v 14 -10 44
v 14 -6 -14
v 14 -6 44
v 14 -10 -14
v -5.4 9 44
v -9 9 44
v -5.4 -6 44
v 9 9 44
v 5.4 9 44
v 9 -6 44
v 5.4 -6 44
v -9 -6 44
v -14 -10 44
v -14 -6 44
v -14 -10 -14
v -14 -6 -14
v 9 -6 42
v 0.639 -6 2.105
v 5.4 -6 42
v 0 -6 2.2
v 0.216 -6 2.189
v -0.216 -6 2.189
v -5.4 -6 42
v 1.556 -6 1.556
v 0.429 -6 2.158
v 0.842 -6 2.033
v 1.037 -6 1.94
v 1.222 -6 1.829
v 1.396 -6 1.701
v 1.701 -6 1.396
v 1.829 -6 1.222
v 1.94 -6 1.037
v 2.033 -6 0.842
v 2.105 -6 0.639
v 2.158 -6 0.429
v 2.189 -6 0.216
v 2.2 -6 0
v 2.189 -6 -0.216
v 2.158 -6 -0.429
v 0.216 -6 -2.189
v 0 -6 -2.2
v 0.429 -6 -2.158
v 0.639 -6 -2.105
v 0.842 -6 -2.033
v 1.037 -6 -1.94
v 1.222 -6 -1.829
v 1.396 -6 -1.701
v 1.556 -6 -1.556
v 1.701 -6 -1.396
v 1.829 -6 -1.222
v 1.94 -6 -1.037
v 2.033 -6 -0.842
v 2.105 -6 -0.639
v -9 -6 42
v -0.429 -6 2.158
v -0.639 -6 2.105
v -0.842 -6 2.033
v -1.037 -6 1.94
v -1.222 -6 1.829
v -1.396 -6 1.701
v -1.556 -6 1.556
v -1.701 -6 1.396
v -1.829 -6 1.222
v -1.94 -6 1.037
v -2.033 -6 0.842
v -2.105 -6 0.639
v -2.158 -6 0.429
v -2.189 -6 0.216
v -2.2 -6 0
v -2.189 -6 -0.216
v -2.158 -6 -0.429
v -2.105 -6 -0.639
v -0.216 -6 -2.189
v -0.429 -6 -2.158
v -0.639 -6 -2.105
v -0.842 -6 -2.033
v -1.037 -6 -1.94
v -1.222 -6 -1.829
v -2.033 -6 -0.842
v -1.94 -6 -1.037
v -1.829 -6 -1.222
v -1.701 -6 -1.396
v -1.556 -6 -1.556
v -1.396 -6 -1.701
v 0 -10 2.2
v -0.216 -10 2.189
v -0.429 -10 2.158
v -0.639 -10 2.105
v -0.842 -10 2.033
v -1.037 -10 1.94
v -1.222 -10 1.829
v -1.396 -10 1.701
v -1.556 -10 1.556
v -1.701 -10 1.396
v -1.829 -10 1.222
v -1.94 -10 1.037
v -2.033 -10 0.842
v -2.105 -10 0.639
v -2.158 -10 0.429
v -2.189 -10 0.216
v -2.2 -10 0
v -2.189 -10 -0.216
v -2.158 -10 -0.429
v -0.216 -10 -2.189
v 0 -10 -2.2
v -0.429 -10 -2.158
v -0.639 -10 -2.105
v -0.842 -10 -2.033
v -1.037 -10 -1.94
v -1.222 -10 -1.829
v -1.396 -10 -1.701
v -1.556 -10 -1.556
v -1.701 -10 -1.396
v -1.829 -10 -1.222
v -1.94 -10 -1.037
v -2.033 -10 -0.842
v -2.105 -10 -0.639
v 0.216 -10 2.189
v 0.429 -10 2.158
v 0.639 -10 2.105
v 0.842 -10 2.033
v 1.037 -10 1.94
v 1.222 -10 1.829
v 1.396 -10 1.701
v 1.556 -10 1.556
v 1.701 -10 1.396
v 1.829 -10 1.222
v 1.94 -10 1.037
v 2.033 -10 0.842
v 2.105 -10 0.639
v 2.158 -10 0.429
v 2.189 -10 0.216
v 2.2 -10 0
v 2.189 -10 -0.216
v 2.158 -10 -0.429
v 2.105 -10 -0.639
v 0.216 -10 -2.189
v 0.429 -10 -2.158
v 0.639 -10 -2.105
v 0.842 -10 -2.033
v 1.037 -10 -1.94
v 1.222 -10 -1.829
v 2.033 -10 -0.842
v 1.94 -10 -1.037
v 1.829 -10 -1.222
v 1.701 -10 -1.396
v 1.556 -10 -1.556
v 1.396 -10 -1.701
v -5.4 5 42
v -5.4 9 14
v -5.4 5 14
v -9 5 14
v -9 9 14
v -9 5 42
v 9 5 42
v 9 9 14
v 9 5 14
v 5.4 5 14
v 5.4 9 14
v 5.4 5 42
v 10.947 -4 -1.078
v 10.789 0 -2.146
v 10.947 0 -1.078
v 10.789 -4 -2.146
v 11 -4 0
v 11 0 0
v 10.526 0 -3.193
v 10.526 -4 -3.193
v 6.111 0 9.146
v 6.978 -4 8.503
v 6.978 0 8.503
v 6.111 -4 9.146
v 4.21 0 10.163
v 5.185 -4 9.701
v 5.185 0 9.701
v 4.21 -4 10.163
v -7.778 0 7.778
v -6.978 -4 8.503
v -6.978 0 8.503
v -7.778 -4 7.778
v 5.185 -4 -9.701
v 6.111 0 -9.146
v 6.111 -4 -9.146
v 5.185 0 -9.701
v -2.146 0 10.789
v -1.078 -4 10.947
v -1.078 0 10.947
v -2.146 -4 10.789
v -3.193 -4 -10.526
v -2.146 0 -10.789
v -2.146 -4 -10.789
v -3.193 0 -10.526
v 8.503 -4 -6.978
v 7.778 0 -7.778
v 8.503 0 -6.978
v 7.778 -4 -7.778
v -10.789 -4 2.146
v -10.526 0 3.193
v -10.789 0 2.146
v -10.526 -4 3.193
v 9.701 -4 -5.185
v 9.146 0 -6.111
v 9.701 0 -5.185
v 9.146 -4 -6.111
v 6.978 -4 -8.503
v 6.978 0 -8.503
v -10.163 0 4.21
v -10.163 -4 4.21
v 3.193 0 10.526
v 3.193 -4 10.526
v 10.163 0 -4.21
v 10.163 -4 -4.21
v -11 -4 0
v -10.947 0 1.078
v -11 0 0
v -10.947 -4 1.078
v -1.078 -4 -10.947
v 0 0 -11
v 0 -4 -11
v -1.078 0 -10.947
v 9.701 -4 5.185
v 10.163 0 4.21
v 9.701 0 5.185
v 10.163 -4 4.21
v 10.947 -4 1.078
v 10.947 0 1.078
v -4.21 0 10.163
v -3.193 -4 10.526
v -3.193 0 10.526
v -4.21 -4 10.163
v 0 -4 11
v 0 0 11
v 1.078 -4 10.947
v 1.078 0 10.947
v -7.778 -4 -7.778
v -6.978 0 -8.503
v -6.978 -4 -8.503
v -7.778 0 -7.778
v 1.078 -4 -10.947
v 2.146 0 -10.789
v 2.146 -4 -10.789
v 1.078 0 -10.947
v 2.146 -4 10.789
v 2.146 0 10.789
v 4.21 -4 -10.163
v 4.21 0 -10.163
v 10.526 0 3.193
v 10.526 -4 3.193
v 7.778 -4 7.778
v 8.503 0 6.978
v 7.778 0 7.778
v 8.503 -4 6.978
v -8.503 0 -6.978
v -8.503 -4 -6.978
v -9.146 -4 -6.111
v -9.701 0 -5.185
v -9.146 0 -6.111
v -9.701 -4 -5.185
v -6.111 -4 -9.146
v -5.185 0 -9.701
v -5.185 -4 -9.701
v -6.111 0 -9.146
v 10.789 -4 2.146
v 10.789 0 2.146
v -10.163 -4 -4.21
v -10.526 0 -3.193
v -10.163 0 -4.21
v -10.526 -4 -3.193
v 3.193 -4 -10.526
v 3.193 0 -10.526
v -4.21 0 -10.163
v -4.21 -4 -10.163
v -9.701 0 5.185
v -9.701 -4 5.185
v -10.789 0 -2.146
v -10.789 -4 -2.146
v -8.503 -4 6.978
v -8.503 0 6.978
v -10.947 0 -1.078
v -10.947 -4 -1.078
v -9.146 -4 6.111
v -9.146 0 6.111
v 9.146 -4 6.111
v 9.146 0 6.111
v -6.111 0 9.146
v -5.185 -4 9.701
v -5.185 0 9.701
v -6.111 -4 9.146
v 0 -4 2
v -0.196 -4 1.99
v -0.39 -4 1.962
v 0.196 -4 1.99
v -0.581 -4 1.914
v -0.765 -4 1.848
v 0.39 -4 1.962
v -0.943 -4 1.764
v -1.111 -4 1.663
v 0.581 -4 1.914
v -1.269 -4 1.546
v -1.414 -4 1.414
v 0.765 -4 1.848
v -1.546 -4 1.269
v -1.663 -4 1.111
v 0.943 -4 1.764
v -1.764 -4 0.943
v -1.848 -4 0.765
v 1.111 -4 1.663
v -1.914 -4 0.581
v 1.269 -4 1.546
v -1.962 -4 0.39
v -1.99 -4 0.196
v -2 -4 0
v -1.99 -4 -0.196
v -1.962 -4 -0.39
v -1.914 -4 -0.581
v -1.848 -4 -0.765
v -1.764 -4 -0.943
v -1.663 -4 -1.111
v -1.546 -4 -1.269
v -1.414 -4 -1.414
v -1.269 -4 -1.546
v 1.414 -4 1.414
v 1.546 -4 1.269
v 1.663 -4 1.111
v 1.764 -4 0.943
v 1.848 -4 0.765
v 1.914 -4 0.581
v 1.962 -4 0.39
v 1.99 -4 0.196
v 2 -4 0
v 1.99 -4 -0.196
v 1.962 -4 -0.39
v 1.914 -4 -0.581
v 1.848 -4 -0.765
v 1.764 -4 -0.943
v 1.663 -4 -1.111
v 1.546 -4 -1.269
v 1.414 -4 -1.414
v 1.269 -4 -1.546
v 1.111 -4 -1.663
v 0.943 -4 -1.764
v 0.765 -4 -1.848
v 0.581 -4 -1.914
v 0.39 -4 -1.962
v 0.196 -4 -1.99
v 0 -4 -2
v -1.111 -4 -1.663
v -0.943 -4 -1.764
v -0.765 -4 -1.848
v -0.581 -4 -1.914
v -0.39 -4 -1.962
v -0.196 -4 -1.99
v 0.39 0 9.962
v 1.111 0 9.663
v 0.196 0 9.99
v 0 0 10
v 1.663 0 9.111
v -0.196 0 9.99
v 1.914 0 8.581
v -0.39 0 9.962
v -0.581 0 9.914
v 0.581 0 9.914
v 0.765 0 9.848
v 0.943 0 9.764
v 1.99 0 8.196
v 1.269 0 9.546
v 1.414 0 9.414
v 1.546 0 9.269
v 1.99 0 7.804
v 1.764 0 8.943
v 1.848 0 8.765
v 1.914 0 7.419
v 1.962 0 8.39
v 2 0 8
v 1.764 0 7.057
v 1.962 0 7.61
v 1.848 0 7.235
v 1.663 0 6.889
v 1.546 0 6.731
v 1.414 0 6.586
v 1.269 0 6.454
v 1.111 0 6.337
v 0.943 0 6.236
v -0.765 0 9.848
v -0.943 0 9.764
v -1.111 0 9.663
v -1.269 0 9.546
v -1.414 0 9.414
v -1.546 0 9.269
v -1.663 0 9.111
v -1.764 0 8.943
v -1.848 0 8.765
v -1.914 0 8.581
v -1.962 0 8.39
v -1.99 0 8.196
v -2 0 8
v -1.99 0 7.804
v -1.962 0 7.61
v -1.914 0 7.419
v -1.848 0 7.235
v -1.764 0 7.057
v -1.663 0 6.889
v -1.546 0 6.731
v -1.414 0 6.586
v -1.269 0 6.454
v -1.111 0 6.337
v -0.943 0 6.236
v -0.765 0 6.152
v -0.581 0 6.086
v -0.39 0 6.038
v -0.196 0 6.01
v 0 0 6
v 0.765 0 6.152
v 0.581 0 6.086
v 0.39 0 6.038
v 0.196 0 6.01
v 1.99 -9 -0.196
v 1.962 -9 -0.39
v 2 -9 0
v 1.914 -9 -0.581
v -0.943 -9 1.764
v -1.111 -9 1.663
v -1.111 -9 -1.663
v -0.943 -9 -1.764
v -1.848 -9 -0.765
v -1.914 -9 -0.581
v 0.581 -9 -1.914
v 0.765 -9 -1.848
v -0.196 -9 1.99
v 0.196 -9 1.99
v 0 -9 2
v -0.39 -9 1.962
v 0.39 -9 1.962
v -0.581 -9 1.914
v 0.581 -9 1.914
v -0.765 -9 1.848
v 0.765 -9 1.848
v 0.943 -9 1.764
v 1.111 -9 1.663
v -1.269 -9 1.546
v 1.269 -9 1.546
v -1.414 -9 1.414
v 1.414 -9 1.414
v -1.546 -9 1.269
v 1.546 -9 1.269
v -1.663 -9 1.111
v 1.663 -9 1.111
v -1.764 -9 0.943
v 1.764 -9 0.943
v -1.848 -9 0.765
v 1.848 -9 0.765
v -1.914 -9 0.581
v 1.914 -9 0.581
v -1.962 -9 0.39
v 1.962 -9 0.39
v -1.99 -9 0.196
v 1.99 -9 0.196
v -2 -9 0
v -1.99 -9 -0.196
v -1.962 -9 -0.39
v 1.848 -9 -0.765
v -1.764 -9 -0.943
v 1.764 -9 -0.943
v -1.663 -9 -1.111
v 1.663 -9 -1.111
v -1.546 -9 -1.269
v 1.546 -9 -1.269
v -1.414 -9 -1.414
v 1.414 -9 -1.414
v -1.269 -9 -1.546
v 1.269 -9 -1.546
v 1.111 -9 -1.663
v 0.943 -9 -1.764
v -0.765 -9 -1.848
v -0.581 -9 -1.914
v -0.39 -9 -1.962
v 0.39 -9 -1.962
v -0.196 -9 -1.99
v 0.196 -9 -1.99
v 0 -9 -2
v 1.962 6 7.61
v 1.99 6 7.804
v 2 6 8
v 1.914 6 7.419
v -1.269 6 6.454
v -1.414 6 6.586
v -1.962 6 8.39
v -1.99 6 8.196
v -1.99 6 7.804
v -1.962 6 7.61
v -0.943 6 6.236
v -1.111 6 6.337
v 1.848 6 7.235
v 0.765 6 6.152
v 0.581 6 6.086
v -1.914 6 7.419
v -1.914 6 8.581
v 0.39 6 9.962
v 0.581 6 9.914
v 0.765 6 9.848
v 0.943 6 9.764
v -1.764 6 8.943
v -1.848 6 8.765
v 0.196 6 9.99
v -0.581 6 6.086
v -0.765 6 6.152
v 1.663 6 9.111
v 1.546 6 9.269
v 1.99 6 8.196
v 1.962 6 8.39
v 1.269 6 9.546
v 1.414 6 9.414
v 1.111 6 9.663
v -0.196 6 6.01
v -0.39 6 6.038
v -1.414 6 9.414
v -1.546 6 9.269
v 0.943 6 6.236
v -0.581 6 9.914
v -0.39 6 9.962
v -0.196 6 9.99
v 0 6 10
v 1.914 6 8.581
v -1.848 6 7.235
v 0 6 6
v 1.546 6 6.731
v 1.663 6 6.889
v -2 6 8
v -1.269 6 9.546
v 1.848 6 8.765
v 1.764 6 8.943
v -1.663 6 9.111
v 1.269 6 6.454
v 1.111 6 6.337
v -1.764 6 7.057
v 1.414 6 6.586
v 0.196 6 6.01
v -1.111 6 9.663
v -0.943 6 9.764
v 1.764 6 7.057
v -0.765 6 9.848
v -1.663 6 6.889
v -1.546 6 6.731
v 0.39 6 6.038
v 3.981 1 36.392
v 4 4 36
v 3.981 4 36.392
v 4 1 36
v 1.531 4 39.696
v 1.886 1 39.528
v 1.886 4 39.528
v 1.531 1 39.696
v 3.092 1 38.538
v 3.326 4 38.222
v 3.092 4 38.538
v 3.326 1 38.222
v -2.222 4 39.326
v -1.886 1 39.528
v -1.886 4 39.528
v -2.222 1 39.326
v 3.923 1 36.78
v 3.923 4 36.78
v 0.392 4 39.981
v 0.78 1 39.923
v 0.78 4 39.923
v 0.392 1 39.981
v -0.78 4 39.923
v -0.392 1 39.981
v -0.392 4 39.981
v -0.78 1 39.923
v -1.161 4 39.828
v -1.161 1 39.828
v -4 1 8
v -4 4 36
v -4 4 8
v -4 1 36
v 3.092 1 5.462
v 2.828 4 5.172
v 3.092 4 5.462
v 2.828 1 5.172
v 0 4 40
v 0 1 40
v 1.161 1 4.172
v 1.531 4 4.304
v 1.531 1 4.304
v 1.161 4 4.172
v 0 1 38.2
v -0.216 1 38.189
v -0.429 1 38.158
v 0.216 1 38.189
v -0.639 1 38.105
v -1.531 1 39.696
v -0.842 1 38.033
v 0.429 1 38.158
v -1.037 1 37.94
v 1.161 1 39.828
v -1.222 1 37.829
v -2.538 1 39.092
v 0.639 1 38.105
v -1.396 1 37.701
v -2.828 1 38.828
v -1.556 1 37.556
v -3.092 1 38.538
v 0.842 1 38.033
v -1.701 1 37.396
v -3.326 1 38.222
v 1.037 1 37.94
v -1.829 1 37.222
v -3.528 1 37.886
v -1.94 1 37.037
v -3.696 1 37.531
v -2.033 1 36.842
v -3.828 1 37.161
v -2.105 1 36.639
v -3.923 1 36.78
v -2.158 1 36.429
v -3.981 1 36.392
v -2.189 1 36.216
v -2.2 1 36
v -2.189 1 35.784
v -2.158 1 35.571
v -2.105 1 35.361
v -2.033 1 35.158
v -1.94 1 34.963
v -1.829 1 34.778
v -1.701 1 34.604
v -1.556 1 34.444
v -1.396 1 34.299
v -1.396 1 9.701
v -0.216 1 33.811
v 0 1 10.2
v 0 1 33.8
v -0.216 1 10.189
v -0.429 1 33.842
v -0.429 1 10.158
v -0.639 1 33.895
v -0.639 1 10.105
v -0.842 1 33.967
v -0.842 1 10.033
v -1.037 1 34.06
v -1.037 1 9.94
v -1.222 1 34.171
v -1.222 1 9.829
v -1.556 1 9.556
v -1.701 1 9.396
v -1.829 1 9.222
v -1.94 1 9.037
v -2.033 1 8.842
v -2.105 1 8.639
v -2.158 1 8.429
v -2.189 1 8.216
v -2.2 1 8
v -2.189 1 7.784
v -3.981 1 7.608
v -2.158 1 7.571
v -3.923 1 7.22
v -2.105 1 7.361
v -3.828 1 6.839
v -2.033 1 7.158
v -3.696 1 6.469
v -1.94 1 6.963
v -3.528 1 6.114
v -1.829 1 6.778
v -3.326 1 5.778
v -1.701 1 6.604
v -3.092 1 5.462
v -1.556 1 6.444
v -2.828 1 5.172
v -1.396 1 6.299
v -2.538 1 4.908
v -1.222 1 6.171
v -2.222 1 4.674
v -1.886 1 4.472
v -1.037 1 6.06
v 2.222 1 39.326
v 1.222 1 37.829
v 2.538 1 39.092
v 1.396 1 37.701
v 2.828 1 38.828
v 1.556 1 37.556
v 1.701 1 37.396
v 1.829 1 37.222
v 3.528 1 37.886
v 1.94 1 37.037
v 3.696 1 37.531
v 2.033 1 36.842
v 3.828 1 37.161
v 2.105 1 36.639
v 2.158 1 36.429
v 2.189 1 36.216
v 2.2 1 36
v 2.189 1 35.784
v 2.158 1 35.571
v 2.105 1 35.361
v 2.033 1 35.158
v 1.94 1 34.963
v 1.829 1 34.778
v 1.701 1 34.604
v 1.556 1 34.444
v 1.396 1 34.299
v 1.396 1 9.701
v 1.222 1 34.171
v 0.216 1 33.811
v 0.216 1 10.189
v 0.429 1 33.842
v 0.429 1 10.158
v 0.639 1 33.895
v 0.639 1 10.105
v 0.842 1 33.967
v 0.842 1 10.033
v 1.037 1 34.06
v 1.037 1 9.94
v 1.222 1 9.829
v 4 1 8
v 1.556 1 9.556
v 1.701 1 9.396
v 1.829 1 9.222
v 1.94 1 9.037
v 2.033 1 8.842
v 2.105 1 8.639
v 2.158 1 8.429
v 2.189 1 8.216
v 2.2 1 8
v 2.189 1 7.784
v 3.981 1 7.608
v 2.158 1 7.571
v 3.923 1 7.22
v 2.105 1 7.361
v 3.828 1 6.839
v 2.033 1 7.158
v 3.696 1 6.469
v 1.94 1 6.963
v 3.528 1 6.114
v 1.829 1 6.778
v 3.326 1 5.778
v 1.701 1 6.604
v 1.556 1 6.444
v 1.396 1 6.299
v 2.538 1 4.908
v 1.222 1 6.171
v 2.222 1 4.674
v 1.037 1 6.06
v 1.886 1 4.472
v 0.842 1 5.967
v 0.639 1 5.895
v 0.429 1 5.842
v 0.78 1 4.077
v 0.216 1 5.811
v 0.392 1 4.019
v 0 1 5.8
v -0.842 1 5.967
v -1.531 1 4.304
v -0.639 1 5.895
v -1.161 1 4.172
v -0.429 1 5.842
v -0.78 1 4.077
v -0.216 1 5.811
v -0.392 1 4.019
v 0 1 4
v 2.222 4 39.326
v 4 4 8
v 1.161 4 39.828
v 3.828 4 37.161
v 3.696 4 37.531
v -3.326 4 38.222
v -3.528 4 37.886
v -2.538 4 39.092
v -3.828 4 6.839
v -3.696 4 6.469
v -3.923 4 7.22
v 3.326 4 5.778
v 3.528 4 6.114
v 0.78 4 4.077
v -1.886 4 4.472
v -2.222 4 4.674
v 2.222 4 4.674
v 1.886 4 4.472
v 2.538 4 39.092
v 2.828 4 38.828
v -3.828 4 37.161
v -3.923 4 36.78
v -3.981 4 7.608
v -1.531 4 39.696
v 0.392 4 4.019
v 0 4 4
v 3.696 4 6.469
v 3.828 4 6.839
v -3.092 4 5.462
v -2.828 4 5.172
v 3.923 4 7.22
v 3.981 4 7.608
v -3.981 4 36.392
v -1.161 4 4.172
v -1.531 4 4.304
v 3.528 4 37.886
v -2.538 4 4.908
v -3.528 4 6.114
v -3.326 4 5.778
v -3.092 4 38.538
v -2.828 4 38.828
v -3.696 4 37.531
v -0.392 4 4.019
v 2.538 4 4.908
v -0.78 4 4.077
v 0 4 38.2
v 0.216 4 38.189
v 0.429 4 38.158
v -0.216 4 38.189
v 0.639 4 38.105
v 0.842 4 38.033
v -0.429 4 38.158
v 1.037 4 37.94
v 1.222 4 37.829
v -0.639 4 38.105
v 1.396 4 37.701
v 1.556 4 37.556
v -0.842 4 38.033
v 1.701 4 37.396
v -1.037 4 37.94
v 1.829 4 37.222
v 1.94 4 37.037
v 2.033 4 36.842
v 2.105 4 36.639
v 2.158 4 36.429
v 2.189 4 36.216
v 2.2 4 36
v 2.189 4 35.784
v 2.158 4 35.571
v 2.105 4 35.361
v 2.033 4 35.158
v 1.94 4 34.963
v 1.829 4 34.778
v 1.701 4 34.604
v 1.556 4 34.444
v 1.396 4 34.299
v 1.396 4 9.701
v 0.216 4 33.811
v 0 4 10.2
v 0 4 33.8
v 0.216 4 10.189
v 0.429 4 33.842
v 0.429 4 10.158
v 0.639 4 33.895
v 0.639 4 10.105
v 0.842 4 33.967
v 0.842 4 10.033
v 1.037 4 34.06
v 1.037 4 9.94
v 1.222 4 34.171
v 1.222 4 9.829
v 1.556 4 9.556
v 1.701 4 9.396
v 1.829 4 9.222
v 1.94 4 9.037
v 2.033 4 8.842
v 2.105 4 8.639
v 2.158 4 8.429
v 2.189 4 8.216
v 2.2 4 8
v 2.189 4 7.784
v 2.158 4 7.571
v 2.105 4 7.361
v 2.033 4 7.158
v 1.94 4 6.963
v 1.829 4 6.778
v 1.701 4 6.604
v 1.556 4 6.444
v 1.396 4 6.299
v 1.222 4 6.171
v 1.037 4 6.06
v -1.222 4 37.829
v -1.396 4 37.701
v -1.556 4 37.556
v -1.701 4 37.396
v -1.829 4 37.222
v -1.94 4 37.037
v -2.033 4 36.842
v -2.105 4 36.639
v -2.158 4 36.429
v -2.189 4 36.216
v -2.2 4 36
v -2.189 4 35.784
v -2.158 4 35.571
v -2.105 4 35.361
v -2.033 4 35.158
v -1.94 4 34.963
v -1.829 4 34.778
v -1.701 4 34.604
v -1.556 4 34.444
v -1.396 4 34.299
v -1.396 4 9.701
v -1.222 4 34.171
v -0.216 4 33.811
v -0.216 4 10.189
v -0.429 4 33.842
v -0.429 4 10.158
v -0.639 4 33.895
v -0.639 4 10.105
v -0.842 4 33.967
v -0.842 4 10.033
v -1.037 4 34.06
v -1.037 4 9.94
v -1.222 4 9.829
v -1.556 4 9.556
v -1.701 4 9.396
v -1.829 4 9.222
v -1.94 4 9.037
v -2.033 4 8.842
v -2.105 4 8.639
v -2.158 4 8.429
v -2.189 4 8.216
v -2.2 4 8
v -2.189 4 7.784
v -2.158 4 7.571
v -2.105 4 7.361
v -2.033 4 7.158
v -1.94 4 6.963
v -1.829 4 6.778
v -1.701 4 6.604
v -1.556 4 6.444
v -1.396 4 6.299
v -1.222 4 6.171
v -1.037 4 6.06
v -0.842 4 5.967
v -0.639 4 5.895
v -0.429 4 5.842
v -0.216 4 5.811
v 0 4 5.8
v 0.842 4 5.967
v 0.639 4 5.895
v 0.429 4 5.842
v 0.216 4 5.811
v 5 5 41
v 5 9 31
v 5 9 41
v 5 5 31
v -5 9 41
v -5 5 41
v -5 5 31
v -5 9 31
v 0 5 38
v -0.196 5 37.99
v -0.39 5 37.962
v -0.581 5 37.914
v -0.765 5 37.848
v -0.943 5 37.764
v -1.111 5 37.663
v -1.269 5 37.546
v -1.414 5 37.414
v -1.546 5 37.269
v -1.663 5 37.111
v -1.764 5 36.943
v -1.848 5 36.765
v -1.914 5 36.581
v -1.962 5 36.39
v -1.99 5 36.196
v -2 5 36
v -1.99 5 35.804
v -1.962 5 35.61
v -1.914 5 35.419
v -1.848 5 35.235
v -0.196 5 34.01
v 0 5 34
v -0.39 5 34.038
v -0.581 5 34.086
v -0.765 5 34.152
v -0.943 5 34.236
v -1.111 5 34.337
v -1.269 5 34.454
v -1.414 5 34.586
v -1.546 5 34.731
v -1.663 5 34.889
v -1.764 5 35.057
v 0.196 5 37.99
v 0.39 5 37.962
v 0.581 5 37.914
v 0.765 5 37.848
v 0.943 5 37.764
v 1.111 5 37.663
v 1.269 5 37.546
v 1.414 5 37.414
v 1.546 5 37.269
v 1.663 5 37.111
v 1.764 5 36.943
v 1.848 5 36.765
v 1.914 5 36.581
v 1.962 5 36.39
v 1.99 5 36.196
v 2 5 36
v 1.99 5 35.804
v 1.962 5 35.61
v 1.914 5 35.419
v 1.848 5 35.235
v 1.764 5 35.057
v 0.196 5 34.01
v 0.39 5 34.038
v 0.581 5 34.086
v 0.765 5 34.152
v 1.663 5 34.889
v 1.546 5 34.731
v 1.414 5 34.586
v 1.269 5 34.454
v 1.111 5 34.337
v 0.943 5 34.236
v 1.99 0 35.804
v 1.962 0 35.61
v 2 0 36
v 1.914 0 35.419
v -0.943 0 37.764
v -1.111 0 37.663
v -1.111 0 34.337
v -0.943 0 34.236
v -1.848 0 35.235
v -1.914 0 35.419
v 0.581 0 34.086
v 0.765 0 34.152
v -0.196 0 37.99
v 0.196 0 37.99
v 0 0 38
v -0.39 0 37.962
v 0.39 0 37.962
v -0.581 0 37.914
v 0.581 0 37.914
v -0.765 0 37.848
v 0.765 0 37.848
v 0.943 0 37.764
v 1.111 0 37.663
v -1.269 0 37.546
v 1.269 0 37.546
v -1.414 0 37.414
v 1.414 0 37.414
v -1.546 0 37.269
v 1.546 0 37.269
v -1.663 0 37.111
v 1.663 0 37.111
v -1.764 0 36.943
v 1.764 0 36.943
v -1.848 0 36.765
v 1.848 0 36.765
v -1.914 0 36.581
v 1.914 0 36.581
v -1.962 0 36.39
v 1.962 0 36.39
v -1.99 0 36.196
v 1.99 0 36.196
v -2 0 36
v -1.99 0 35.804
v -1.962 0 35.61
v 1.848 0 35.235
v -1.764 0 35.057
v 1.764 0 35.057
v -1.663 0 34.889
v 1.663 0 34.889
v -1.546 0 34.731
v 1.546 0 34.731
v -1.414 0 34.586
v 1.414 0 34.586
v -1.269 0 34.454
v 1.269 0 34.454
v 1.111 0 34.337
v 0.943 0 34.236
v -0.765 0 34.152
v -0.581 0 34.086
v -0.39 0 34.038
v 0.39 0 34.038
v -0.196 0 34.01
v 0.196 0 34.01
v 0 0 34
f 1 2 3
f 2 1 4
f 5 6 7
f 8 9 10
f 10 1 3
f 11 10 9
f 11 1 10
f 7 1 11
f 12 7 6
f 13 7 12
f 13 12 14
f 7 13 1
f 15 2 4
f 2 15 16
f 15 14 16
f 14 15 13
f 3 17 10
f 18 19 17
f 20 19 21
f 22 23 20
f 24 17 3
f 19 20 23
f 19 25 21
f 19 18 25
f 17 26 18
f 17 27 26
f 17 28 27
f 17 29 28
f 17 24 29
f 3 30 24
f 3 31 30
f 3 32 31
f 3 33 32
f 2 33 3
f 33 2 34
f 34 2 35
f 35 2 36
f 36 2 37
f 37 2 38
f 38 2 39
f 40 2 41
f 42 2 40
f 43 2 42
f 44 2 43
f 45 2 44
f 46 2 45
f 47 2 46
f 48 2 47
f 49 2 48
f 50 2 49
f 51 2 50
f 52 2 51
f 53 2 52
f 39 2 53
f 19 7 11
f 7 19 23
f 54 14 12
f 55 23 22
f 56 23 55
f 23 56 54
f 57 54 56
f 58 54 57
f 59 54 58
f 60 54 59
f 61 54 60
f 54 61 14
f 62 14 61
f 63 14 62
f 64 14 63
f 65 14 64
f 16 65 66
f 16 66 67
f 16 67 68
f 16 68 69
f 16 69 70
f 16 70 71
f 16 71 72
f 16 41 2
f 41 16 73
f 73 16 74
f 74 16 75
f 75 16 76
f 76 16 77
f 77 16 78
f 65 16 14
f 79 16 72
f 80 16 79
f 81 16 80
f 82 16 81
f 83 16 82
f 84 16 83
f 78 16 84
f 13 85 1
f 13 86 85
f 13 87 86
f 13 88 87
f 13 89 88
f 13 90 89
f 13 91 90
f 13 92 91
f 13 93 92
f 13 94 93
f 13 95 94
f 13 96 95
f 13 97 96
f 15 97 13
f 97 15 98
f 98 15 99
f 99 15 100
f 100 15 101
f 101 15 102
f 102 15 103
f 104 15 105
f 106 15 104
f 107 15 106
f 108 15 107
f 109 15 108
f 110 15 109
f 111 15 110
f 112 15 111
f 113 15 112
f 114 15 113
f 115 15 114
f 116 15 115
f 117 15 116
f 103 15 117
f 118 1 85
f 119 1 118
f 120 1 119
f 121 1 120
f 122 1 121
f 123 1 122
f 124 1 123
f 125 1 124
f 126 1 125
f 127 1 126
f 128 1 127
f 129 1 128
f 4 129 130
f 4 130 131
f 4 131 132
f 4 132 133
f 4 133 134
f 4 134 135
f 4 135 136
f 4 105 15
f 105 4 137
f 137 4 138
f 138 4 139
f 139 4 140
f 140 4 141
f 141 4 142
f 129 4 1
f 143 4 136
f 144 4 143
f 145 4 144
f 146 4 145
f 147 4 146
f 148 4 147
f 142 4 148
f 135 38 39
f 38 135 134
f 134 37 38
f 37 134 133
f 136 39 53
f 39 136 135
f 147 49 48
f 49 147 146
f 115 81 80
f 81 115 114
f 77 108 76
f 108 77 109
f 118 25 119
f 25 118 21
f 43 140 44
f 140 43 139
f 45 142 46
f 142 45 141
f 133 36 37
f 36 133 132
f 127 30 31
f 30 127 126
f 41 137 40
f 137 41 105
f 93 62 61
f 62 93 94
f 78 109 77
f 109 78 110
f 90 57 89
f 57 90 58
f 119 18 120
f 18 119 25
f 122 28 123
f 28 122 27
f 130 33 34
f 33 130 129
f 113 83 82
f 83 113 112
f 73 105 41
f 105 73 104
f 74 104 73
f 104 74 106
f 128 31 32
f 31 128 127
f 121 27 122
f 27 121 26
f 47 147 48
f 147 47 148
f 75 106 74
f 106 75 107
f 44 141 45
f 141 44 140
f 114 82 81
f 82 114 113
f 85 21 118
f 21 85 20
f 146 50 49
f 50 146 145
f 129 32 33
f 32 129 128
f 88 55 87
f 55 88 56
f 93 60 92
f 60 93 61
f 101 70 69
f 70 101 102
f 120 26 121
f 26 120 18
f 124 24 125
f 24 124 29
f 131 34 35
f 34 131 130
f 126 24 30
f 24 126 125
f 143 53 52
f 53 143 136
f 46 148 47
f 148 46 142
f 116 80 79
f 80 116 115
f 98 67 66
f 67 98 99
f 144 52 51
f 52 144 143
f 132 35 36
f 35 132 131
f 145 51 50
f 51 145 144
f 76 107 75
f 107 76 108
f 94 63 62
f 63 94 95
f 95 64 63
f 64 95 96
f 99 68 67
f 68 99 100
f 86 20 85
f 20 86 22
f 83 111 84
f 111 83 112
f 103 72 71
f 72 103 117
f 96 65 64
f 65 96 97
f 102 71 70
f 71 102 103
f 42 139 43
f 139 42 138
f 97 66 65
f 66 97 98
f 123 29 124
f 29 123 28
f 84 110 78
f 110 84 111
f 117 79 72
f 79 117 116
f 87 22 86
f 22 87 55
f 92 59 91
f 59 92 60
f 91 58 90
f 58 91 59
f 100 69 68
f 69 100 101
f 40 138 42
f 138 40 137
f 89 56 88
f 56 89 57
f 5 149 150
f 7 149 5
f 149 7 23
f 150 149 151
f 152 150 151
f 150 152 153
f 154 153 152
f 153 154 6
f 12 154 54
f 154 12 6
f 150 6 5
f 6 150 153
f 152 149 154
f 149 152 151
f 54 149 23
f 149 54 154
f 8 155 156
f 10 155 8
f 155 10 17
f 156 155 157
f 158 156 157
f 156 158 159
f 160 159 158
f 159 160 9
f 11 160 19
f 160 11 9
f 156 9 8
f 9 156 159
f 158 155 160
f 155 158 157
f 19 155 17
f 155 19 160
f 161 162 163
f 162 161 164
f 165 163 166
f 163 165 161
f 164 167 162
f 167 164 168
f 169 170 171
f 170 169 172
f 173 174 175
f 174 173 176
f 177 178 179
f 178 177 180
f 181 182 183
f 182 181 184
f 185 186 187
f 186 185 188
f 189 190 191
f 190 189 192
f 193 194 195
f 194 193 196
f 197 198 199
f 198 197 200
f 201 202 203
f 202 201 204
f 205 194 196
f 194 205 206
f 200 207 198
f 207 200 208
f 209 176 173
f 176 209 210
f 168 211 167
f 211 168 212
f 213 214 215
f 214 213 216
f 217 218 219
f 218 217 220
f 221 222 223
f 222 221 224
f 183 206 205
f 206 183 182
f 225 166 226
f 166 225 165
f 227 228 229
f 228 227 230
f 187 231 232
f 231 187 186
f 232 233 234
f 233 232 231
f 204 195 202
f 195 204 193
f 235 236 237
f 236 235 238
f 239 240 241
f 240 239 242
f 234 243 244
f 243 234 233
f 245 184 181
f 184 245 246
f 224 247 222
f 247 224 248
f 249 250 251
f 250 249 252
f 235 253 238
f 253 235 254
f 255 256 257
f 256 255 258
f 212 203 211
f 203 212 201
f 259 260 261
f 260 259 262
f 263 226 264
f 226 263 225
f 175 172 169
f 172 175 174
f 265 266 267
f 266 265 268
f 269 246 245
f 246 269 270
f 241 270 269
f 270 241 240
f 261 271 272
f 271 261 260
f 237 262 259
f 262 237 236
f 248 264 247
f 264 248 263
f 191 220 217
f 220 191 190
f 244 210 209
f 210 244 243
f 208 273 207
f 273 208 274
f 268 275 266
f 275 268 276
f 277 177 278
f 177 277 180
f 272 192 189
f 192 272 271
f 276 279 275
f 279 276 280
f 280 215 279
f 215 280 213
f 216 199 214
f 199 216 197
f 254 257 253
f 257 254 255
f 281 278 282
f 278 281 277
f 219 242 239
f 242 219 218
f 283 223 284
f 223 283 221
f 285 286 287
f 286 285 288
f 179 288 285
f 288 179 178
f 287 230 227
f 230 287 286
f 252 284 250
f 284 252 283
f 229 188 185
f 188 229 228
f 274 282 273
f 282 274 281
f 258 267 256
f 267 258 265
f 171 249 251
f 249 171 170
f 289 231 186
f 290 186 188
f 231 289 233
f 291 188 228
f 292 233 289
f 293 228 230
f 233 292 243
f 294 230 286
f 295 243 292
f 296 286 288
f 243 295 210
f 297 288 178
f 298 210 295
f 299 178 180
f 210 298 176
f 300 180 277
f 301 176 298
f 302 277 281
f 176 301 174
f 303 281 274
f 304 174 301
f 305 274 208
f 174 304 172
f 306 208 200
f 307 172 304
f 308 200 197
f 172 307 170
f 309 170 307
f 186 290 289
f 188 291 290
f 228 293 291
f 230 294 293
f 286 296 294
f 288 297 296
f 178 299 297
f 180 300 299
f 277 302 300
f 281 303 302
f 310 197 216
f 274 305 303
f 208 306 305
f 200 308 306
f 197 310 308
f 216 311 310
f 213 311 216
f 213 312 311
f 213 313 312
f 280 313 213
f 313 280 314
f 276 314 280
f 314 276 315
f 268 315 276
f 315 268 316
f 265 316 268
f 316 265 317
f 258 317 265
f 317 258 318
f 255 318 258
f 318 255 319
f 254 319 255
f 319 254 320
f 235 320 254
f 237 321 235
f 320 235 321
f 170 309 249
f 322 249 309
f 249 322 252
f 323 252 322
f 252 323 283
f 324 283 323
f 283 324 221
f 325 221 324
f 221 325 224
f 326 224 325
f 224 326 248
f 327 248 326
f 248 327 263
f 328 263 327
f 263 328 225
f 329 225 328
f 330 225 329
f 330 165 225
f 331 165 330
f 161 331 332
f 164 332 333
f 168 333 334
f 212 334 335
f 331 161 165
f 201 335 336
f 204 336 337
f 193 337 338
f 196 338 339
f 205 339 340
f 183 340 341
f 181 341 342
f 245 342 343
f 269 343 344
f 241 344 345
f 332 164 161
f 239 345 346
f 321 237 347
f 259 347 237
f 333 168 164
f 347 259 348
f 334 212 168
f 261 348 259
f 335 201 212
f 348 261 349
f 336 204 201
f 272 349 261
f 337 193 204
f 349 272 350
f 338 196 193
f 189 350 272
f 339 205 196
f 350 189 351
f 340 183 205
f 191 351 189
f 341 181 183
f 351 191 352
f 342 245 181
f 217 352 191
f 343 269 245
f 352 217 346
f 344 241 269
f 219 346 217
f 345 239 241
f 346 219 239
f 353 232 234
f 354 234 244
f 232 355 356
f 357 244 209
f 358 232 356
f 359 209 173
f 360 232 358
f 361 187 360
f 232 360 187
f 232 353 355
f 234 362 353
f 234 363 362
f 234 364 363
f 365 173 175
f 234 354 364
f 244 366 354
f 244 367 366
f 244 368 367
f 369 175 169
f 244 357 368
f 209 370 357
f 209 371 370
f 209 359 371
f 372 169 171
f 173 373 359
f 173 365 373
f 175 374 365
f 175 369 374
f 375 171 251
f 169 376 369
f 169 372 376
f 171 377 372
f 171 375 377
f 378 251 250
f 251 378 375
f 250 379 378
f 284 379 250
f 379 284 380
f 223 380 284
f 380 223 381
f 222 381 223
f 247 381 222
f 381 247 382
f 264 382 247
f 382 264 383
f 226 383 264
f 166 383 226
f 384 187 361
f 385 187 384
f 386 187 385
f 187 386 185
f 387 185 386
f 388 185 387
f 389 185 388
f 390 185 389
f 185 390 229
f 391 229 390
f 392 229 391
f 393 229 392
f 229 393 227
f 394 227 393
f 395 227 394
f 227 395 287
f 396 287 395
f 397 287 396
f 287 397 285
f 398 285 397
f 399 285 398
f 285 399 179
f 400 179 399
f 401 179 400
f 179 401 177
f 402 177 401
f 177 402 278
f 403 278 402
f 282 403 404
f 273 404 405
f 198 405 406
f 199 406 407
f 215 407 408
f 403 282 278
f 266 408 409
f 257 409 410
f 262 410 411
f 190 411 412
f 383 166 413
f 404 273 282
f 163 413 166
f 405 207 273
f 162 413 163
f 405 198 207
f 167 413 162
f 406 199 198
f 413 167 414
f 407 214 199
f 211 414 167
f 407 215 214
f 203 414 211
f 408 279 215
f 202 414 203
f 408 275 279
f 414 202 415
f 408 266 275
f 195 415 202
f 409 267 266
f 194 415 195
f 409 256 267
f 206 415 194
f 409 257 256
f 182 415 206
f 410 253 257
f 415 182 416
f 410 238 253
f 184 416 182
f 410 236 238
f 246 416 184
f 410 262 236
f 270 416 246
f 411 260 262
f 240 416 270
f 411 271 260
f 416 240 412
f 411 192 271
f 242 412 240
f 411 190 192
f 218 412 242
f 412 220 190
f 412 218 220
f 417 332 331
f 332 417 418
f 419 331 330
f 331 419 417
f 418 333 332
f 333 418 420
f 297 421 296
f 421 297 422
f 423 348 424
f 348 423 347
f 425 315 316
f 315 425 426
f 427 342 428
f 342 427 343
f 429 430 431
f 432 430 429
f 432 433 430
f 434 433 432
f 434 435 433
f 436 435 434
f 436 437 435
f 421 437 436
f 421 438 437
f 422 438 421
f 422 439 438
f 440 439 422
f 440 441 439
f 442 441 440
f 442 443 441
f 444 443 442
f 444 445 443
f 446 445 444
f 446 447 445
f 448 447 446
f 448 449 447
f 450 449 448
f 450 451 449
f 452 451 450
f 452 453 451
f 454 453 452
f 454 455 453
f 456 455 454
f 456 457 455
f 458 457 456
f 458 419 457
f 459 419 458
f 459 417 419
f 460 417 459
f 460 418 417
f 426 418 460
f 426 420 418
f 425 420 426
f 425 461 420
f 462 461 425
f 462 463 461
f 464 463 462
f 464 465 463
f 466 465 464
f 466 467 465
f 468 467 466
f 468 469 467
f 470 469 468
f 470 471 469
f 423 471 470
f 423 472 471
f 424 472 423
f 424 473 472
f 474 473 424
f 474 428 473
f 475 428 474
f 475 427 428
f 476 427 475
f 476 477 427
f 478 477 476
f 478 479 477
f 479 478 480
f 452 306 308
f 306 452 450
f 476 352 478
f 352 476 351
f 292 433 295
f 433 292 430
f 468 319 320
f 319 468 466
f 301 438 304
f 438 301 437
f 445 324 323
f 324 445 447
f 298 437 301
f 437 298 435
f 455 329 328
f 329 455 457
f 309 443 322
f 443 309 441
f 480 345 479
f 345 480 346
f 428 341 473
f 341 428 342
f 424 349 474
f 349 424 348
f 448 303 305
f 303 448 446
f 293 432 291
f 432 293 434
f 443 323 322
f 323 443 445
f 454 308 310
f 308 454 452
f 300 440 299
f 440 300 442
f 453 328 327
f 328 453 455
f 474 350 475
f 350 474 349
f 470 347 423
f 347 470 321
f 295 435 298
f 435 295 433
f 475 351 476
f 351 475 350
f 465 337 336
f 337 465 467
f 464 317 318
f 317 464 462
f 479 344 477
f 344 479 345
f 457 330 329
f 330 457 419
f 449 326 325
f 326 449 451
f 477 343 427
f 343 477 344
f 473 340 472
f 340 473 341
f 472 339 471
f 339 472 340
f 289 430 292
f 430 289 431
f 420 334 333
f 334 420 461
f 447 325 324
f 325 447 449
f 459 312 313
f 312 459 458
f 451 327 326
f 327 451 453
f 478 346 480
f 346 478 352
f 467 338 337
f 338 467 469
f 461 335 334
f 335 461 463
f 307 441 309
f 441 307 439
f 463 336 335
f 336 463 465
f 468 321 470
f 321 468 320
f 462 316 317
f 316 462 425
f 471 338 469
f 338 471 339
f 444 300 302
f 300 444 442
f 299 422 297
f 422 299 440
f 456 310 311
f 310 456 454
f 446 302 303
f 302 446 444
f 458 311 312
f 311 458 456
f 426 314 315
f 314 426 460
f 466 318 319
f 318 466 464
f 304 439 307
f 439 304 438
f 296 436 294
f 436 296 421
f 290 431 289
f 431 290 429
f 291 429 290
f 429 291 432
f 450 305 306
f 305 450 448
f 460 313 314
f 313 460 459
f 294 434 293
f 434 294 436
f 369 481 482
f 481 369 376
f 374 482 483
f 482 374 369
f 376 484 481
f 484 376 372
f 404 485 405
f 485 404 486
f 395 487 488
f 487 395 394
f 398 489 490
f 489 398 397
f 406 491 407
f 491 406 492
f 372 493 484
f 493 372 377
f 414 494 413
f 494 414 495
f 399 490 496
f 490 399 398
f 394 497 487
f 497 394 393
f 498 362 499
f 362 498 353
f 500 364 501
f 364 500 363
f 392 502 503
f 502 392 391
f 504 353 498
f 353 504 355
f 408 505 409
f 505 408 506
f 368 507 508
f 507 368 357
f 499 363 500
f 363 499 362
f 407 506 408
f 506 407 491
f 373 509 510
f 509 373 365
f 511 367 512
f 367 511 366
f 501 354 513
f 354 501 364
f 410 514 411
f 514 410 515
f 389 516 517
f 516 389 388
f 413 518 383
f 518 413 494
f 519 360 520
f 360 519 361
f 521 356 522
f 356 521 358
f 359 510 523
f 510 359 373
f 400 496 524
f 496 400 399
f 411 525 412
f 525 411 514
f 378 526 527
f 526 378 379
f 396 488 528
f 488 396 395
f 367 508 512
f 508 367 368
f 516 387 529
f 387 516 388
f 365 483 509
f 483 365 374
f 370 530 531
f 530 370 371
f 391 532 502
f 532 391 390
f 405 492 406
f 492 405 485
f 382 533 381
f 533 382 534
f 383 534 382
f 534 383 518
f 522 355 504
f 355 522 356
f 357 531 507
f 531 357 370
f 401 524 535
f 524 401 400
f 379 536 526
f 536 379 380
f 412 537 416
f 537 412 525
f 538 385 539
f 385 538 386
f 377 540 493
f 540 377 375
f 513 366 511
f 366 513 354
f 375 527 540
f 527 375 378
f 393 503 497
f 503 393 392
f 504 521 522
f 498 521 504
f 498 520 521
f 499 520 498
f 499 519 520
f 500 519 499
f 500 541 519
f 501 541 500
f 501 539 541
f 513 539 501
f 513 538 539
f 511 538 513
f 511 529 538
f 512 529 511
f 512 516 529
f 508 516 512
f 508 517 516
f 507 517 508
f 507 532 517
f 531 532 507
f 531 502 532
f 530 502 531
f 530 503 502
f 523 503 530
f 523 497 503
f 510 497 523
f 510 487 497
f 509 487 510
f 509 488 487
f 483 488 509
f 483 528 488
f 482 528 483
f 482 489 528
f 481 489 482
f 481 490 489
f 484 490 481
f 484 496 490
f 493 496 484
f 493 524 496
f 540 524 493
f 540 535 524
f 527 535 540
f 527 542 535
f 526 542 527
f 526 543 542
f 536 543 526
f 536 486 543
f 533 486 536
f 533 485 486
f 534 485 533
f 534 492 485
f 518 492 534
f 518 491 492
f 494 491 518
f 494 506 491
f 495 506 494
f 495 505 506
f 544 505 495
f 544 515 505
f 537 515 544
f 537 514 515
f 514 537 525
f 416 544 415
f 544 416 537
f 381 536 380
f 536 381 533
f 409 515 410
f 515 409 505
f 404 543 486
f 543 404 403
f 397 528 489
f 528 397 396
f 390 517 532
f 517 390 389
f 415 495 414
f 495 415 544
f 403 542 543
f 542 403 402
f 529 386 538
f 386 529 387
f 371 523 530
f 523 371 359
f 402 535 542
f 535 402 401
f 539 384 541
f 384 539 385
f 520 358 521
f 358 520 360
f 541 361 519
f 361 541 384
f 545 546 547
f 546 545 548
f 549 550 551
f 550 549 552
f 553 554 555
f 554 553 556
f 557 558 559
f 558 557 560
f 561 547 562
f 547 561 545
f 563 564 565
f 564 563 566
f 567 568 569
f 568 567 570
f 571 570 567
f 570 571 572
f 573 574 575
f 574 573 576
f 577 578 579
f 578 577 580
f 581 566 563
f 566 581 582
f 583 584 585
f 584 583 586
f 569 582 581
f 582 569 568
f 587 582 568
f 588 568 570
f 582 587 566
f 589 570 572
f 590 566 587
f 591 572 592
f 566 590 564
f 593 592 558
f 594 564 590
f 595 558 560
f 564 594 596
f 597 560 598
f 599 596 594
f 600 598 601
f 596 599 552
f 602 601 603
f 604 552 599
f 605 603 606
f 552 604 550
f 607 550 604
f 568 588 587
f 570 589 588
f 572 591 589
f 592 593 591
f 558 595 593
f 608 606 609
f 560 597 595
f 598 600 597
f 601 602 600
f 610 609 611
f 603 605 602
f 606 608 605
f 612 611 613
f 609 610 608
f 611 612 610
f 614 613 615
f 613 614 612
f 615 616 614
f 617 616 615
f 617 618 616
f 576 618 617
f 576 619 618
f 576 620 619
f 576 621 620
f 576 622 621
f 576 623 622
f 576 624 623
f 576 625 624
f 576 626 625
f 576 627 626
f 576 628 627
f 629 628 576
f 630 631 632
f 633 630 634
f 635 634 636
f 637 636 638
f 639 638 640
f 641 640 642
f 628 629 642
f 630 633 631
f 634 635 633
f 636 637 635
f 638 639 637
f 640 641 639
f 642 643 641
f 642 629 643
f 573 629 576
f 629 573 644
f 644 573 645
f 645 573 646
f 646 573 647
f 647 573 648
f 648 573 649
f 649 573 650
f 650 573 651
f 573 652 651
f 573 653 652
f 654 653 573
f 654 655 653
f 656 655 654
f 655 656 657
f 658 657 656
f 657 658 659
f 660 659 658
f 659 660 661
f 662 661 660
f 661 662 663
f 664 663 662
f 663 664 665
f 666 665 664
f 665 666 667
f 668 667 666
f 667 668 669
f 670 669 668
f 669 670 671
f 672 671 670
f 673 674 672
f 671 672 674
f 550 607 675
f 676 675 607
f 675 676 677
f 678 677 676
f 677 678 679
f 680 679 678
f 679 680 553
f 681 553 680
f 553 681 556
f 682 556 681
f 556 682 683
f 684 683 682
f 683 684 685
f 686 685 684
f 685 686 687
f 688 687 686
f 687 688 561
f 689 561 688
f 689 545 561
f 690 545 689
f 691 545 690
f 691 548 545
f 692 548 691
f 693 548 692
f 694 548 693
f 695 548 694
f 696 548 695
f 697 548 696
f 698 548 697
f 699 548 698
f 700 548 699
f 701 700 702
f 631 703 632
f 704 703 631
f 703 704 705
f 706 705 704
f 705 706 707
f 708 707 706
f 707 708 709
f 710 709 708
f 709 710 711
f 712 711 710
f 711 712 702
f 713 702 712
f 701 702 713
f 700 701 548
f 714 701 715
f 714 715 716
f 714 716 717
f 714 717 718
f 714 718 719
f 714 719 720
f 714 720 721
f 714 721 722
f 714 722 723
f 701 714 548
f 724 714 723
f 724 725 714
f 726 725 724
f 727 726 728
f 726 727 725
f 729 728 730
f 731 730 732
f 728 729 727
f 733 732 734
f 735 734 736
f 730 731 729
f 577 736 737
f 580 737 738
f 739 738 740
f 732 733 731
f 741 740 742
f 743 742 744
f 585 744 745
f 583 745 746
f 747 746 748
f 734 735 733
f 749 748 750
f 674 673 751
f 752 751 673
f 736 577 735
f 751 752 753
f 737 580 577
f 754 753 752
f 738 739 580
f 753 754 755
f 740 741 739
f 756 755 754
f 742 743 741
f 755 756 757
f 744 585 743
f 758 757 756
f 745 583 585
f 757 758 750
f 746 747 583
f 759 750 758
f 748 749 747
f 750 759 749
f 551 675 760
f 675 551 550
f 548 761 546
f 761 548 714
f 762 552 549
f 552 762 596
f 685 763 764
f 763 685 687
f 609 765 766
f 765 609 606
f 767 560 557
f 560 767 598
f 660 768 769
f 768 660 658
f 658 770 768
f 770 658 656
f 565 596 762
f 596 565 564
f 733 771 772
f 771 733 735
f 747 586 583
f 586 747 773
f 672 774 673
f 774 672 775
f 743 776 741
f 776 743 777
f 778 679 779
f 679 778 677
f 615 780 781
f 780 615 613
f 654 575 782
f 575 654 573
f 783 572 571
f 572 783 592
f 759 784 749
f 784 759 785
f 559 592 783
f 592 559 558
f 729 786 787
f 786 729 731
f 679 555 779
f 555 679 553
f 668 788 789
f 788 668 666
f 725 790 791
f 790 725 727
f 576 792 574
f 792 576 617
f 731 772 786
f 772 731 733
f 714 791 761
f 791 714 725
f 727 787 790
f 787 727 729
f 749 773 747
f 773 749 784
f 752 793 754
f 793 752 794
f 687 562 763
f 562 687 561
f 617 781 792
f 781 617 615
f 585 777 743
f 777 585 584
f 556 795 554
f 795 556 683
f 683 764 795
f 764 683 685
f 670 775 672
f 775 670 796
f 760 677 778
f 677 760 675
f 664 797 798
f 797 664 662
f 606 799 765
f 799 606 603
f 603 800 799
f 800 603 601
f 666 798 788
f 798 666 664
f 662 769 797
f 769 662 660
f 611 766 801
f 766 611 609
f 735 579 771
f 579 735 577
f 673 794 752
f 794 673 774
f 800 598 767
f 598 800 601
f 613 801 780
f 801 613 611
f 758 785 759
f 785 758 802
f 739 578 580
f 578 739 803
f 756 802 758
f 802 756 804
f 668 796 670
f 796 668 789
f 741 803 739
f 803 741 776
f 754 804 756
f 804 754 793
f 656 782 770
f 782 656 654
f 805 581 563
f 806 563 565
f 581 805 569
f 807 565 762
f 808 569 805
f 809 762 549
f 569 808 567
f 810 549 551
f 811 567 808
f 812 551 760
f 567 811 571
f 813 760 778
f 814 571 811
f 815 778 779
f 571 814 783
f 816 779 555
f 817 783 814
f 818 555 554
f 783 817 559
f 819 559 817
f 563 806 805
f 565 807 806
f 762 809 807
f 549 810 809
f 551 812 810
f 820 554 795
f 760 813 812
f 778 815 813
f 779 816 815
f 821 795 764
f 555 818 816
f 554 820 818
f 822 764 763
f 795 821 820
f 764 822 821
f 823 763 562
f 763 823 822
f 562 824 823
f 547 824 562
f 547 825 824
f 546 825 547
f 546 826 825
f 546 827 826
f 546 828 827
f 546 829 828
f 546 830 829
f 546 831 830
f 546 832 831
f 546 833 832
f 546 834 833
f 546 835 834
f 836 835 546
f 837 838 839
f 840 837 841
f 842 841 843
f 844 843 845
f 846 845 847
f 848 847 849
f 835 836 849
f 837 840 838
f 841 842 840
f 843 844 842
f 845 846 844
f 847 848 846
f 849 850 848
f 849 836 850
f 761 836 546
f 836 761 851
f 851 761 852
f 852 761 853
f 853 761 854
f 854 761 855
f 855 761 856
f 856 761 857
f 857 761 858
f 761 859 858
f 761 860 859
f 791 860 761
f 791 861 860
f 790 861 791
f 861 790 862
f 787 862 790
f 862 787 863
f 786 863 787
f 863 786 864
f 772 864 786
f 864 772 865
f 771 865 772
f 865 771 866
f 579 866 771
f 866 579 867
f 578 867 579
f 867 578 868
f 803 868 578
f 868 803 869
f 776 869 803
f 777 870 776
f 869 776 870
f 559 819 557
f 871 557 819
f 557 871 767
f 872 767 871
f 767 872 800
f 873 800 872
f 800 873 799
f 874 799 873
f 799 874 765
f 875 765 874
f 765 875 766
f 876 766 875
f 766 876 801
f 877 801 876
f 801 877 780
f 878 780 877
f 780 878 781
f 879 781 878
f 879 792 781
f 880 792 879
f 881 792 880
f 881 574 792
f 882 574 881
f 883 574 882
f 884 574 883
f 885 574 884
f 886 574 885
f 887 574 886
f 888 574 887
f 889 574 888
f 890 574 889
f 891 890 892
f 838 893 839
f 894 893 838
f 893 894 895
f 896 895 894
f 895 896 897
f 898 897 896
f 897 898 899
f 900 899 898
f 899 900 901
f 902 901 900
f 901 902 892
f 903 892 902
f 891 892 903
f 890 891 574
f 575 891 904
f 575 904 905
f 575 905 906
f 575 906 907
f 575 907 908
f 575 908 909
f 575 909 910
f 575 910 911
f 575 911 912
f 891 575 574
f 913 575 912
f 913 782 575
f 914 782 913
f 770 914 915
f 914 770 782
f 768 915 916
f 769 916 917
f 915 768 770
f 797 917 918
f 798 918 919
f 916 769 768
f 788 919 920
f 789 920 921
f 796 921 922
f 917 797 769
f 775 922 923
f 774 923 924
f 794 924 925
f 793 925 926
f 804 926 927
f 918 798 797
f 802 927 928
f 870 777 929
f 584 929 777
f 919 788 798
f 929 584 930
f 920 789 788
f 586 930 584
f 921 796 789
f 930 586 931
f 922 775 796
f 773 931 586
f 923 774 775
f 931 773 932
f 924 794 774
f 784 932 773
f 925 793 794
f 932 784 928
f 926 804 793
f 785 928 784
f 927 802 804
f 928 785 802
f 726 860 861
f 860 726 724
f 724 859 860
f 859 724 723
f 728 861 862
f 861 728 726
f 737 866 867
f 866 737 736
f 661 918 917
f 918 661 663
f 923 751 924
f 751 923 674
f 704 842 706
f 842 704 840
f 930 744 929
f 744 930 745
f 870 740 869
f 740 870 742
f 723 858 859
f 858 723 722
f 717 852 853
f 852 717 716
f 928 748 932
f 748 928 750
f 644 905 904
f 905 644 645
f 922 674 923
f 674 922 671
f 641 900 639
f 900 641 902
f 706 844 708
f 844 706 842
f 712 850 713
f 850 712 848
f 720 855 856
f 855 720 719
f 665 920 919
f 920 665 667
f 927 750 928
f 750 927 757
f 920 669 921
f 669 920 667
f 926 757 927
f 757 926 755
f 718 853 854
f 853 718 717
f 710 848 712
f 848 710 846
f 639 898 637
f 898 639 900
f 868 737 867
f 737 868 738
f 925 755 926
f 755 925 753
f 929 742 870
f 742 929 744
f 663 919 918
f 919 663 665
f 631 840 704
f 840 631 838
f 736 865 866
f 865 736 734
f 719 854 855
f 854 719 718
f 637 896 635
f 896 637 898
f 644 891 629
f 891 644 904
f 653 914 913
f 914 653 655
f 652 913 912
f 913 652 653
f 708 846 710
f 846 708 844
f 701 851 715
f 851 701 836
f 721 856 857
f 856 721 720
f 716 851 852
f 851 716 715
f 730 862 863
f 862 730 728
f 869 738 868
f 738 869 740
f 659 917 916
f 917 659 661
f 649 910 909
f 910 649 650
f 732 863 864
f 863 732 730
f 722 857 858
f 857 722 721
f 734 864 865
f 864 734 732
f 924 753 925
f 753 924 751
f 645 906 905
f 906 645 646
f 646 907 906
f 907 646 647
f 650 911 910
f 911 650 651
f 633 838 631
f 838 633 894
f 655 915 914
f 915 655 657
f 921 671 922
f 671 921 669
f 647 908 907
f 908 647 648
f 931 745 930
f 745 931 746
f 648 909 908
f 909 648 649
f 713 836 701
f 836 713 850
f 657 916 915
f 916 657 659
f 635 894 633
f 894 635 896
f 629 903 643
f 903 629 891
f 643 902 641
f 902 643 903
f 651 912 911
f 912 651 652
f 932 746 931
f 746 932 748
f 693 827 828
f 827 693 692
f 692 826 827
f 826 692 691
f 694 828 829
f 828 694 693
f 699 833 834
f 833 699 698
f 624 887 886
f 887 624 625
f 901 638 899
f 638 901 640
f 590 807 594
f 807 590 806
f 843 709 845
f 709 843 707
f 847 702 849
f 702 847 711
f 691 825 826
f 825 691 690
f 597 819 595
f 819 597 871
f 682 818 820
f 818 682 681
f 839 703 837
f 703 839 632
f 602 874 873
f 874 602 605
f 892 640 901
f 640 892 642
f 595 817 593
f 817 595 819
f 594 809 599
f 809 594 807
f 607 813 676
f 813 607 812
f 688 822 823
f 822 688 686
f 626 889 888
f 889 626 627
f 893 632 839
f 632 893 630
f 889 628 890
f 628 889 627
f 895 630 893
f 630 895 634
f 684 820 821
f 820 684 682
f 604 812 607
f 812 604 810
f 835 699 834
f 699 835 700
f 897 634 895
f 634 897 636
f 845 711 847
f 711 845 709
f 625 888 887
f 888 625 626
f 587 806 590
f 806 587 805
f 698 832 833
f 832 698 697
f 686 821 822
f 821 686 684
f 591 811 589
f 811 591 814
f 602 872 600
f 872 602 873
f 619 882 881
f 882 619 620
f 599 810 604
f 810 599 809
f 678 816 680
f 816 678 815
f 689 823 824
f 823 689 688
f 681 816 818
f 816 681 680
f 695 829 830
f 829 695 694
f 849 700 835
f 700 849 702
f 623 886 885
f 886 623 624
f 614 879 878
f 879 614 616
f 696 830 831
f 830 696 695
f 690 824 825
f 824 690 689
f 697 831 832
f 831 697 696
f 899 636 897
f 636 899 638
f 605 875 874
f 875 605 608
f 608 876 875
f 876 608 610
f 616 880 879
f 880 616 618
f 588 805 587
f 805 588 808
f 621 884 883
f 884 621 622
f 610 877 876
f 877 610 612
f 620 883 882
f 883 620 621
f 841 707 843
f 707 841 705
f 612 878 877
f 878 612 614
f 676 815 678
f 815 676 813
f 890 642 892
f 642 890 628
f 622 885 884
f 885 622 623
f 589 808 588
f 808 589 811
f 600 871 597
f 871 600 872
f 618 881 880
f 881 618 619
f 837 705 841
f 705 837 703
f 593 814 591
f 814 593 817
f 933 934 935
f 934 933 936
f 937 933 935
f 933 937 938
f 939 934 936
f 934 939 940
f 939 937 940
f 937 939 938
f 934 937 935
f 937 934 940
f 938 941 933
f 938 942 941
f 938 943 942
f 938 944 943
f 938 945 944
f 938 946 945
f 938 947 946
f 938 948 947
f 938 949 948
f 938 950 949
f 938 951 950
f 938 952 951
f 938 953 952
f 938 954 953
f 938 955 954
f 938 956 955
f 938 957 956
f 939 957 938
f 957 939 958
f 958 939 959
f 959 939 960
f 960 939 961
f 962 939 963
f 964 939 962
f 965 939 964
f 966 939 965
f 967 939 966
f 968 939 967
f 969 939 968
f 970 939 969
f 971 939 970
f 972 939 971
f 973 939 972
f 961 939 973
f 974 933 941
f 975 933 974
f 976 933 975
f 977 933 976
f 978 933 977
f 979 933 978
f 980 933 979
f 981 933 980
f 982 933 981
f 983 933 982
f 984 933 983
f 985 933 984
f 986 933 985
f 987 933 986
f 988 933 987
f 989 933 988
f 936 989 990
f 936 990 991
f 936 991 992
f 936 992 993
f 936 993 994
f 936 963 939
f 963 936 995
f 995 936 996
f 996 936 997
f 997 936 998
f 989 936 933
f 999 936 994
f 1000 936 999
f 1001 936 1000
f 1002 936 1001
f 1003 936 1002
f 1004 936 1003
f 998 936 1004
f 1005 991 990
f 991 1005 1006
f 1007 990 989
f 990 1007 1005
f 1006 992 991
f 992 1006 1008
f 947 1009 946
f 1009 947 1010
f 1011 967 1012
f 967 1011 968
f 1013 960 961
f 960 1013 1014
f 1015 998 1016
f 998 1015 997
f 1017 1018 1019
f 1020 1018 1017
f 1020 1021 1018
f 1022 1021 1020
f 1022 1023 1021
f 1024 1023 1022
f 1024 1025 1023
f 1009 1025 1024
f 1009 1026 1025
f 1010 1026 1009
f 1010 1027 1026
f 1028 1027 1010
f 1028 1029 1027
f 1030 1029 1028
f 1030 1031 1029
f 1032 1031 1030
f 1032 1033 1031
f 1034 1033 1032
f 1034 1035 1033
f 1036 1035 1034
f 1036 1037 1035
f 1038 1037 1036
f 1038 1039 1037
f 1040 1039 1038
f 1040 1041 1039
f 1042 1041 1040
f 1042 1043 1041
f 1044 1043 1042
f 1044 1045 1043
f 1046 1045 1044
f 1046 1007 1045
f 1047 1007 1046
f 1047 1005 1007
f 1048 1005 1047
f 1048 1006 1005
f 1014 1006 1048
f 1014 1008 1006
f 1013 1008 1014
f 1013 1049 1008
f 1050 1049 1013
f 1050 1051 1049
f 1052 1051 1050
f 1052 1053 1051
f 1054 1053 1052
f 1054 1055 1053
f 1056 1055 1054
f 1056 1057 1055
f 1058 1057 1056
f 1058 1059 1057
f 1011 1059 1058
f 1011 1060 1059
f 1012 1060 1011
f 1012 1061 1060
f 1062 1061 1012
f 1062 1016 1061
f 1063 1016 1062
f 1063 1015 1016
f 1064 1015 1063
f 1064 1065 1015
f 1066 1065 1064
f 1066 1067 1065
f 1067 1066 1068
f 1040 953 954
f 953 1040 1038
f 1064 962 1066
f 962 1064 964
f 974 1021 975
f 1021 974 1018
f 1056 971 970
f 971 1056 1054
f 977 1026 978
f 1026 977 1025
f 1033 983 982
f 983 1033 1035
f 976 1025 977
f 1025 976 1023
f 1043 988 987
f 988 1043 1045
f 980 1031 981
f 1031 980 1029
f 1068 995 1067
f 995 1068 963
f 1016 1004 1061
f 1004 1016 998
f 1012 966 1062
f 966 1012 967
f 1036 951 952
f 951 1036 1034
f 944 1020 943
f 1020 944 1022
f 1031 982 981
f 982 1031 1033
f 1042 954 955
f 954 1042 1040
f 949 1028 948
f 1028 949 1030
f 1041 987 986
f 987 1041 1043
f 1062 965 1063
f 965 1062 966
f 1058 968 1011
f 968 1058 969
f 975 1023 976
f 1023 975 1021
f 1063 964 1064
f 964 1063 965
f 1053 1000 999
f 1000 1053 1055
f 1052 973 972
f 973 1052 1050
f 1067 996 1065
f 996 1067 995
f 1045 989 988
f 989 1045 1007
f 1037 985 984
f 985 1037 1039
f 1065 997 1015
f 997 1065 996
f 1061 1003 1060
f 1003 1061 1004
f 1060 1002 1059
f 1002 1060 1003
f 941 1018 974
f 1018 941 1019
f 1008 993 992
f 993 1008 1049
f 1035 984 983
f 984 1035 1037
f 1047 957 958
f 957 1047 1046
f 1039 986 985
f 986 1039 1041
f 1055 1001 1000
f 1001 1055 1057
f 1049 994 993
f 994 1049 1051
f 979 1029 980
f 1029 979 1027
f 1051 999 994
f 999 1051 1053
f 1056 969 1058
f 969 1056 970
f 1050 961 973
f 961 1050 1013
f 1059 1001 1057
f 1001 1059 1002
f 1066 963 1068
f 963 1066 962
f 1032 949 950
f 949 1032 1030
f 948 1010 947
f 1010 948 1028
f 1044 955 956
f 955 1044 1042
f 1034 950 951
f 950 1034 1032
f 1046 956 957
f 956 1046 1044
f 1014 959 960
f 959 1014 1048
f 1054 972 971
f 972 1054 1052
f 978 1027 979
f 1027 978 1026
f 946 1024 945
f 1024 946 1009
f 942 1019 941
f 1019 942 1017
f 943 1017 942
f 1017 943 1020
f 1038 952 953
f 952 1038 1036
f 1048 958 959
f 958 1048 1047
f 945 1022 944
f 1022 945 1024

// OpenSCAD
// Original low-speed slider-crank verification fixture with an embedded
// assembly declaration. The declaration is a proposal; the verifier measures
// the rendered source against independent analytic expectations.
// declaration removed by adversarial fixture
// Original low-speed slider-crank verification fixture, millimetres.
// Four manufacturing parts. Pins are integral; external axial retention is
// required. No load capacity, print tolerance or physical function is claimed.
agentscad_part = "all";
agentscad_pose = false;
motion_angle = 0;
crank_radius = 8;
rod_length = 28;
$fn = 64;

// All pin axes are parallel to +Y; the mechanism moves in the XZ plane.
module y_cylinder(radius, height) { rotate([-90, 0, 0]) cylinder(r=radius, h=height); }
module crank_local() {
  union() {
    translate([0, -4, 0]) y_cylinder(crank_radius + 3, 4);
    translate([0, -9, 0]) y_cylinder(2, 5.1);
    translate([0, -0.1, crank_radius]) y_cylinder(2, 6.1);
  }
}
module rod_local() {
  difference() {
    hull() {
      translate([0, 1, 0]) y_cylinder(4, 3);
      translate([0, 1, rod_length]) y_cylinder(4, 3);
    }
    translate([0, 0.9, 0]) y_cylinder(2.2, 3.2);
    translate([0, 0.9, rod_length]) y_cylinder(2.2, 3.2);
  }
}
module slider_local() {
  union() {
    translate([-5, 5, -5]) cube([10, 4, 10]);
    y_cylinder(2, 5.1);
  }
}
module frame_local() {
  union() {
    difference() {
      translate([-14, -10, -14]) cube([28, 4, 58]);
      translate([0, -10.1, 0]) y_cylinder(2.2, 4.2);
    }
    for (x = [-9, 5.4]) {
      translate([x, 5, 14]) cube([3.6, 4, 30]);
      translate([x, -6.1, 42]) cube([3.6, 11.2, 2]);
    }
  }
}

// Source-side construction. The checker measures the resulting mesh contours;
// it never consumes these functions or their computed coordinates as evidence.
cx = crank_radius * sin(motion_angle);
cz = crank_radius * cos(motion_angle);
travel = sqrt(rod_length * rod_length - cx * cx);
pz = cz + travel;
rod_angle = atan2(-cx, travel);
module selected_part(id, placed) {
  if (id == "frame") frame_local();
  if (id == "crank") rotate([0, placed ? motion_angle : 0, 0]) crank_local();
  if (id == "rod") translate(placed ? [cx, 0, cz] : [0, 0, 0])
    rotate([0, placed ? rod_angle : 0, 0]) rod_local();
  if (id == "slider") translate([0, 0, placed ? pz : 0]) slider_local();
}
module generated_part() {
  if (agentscad_part == "all") {
    for (id = ["frame", "crank", "rod", "slider"]) selected_part(id, true);
  } else selected_part(agentscad_part, agentscad_pose);
}
generated_part();
